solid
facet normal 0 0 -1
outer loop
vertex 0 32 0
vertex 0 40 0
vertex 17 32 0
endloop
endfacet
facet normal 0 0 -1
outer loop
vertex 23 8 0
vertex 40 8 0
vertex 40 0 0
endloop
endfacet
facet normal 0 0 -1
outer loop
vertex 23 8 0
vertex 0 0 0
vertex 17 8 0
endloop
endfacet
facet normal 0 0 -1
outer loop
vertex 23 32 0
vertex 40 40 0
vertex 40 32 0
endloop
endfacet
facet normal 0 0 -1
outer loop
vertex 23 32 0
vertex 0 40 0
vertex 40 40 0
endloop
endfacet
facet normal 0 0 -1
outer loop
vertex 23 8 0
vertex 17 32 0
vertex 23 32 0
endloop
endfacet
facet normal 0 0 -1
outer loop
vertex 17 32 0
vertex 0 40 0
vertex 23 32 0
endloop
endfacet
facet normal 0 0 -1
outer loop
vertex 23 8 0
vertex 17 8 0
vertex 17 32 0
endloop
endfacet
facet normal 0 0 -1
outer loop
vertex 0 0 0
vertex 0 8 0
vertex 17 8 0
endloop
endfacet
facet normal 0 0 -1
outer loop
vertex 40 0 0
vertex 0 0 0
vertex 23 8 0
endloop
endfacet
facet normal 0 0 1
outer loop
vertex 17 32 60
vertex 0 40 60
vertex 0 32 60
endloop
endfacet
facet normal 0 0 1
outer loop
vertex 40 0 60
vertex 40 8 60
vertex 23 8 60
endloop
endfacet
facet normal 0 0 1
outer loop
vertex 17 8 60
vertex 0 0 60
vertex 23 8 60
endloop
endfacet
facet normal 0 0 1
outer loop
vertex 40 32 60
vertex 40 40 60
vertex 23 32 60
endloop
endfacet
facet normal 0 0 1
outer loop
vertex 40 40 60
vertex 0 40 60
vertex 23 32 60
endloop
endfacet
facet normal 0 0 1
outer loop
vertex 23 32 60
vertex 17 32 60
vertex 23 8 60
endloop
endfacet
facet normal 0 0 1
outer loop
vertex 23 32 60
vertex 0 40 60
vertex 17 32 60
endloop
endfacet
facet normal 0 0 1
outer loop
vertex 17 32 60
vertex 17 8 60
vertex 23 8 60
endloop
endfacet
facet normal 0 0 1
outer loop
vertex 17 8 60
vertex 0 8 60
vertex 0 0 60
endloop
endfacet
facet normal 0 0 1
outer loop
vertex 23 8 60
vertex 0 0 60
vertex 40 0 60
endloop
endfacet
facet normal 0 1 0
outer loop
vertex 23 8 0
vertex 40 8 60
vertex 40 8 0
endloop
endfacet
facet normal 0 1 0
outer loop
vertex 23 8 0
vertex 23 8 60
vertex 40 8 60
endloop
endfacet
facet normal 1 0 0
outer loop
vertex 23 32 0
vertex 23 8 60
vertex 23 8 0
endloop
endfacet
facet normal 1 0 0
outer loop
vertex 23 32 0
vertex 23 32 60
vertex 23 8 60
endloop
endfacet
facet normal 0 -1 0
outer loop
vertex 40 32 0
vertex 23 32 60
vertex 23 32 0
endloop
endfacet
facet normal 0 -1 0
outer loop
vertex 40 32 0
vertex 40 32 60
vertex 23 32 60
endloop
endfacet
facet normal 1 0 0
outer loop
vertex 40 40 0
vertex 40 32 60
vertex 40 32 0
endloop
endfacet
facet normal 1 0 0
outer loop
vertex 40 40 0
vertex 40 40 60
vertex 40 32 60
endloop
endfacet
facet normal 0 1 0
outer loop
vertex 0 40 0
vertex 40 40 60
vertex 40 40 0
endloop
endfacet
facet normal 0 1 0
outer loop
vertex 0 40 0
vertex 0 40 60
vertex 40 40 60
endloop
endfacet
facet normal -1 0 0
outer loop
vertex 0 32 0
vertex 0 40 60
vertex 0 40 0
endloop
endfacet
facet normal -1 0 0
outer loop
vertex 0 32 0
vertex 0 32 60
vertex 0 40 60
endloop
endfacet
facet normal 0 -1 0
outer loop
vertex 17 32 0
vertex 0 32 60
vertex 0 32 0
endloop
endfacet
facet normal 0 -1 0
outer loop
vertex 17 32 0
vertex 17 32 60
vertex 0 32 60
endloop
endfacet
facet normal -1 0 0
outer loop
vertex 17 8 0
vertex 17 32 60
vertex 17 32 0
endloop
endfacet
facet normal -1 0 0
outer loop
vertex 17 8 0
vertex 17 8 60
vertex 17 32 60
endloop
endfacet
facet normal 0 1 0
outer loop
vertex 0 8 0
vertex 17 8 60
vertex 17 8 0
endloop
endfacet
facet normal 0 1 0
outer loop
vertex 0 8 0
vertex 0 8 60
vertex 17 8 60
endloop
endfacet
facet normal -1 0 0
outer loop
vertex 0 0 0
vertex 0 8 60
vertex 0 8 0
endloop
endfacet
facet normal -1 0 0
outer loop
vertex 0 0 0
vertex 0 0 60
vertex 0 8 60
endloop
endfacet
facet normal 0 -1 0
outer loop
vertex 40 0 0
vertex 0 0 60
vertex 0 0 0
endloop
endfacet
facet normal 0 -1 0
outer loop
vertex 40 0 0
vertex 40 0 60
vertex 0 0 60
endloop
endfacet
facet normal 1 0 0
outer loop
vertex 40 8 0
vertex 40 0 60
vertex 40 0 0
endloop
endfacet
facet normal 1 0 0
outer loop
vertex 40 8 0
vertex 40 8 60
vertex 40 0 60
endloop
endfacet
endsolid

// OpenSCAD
$fn = 32;

// ----------------------------------------------------------------------
// Structural section: ibeam 40 x 40 mm
// ----------------------------------------------------------------------

// --- parameters (mm) ---
sec_w = 40;               // section width, X
sec_h = 40;               // section height, Y
flange_t = 8;             // flange thickness
web_t = 6;                // web thickness
plate_t = 60;             // cut length, Z (extrusion height)

profile = [[0, 0], [40, 0], [40, 8], [23, 8], [23, 32], [40, 32], [40, 40], [0, 40], [0, 32], [17, 32], [17, 8], [0, 8]];  // primary outline, 12 points, counter clockwise

// --- the one profile operation ---
linear_extrude(height = plate_t) polygon(points = profile);
